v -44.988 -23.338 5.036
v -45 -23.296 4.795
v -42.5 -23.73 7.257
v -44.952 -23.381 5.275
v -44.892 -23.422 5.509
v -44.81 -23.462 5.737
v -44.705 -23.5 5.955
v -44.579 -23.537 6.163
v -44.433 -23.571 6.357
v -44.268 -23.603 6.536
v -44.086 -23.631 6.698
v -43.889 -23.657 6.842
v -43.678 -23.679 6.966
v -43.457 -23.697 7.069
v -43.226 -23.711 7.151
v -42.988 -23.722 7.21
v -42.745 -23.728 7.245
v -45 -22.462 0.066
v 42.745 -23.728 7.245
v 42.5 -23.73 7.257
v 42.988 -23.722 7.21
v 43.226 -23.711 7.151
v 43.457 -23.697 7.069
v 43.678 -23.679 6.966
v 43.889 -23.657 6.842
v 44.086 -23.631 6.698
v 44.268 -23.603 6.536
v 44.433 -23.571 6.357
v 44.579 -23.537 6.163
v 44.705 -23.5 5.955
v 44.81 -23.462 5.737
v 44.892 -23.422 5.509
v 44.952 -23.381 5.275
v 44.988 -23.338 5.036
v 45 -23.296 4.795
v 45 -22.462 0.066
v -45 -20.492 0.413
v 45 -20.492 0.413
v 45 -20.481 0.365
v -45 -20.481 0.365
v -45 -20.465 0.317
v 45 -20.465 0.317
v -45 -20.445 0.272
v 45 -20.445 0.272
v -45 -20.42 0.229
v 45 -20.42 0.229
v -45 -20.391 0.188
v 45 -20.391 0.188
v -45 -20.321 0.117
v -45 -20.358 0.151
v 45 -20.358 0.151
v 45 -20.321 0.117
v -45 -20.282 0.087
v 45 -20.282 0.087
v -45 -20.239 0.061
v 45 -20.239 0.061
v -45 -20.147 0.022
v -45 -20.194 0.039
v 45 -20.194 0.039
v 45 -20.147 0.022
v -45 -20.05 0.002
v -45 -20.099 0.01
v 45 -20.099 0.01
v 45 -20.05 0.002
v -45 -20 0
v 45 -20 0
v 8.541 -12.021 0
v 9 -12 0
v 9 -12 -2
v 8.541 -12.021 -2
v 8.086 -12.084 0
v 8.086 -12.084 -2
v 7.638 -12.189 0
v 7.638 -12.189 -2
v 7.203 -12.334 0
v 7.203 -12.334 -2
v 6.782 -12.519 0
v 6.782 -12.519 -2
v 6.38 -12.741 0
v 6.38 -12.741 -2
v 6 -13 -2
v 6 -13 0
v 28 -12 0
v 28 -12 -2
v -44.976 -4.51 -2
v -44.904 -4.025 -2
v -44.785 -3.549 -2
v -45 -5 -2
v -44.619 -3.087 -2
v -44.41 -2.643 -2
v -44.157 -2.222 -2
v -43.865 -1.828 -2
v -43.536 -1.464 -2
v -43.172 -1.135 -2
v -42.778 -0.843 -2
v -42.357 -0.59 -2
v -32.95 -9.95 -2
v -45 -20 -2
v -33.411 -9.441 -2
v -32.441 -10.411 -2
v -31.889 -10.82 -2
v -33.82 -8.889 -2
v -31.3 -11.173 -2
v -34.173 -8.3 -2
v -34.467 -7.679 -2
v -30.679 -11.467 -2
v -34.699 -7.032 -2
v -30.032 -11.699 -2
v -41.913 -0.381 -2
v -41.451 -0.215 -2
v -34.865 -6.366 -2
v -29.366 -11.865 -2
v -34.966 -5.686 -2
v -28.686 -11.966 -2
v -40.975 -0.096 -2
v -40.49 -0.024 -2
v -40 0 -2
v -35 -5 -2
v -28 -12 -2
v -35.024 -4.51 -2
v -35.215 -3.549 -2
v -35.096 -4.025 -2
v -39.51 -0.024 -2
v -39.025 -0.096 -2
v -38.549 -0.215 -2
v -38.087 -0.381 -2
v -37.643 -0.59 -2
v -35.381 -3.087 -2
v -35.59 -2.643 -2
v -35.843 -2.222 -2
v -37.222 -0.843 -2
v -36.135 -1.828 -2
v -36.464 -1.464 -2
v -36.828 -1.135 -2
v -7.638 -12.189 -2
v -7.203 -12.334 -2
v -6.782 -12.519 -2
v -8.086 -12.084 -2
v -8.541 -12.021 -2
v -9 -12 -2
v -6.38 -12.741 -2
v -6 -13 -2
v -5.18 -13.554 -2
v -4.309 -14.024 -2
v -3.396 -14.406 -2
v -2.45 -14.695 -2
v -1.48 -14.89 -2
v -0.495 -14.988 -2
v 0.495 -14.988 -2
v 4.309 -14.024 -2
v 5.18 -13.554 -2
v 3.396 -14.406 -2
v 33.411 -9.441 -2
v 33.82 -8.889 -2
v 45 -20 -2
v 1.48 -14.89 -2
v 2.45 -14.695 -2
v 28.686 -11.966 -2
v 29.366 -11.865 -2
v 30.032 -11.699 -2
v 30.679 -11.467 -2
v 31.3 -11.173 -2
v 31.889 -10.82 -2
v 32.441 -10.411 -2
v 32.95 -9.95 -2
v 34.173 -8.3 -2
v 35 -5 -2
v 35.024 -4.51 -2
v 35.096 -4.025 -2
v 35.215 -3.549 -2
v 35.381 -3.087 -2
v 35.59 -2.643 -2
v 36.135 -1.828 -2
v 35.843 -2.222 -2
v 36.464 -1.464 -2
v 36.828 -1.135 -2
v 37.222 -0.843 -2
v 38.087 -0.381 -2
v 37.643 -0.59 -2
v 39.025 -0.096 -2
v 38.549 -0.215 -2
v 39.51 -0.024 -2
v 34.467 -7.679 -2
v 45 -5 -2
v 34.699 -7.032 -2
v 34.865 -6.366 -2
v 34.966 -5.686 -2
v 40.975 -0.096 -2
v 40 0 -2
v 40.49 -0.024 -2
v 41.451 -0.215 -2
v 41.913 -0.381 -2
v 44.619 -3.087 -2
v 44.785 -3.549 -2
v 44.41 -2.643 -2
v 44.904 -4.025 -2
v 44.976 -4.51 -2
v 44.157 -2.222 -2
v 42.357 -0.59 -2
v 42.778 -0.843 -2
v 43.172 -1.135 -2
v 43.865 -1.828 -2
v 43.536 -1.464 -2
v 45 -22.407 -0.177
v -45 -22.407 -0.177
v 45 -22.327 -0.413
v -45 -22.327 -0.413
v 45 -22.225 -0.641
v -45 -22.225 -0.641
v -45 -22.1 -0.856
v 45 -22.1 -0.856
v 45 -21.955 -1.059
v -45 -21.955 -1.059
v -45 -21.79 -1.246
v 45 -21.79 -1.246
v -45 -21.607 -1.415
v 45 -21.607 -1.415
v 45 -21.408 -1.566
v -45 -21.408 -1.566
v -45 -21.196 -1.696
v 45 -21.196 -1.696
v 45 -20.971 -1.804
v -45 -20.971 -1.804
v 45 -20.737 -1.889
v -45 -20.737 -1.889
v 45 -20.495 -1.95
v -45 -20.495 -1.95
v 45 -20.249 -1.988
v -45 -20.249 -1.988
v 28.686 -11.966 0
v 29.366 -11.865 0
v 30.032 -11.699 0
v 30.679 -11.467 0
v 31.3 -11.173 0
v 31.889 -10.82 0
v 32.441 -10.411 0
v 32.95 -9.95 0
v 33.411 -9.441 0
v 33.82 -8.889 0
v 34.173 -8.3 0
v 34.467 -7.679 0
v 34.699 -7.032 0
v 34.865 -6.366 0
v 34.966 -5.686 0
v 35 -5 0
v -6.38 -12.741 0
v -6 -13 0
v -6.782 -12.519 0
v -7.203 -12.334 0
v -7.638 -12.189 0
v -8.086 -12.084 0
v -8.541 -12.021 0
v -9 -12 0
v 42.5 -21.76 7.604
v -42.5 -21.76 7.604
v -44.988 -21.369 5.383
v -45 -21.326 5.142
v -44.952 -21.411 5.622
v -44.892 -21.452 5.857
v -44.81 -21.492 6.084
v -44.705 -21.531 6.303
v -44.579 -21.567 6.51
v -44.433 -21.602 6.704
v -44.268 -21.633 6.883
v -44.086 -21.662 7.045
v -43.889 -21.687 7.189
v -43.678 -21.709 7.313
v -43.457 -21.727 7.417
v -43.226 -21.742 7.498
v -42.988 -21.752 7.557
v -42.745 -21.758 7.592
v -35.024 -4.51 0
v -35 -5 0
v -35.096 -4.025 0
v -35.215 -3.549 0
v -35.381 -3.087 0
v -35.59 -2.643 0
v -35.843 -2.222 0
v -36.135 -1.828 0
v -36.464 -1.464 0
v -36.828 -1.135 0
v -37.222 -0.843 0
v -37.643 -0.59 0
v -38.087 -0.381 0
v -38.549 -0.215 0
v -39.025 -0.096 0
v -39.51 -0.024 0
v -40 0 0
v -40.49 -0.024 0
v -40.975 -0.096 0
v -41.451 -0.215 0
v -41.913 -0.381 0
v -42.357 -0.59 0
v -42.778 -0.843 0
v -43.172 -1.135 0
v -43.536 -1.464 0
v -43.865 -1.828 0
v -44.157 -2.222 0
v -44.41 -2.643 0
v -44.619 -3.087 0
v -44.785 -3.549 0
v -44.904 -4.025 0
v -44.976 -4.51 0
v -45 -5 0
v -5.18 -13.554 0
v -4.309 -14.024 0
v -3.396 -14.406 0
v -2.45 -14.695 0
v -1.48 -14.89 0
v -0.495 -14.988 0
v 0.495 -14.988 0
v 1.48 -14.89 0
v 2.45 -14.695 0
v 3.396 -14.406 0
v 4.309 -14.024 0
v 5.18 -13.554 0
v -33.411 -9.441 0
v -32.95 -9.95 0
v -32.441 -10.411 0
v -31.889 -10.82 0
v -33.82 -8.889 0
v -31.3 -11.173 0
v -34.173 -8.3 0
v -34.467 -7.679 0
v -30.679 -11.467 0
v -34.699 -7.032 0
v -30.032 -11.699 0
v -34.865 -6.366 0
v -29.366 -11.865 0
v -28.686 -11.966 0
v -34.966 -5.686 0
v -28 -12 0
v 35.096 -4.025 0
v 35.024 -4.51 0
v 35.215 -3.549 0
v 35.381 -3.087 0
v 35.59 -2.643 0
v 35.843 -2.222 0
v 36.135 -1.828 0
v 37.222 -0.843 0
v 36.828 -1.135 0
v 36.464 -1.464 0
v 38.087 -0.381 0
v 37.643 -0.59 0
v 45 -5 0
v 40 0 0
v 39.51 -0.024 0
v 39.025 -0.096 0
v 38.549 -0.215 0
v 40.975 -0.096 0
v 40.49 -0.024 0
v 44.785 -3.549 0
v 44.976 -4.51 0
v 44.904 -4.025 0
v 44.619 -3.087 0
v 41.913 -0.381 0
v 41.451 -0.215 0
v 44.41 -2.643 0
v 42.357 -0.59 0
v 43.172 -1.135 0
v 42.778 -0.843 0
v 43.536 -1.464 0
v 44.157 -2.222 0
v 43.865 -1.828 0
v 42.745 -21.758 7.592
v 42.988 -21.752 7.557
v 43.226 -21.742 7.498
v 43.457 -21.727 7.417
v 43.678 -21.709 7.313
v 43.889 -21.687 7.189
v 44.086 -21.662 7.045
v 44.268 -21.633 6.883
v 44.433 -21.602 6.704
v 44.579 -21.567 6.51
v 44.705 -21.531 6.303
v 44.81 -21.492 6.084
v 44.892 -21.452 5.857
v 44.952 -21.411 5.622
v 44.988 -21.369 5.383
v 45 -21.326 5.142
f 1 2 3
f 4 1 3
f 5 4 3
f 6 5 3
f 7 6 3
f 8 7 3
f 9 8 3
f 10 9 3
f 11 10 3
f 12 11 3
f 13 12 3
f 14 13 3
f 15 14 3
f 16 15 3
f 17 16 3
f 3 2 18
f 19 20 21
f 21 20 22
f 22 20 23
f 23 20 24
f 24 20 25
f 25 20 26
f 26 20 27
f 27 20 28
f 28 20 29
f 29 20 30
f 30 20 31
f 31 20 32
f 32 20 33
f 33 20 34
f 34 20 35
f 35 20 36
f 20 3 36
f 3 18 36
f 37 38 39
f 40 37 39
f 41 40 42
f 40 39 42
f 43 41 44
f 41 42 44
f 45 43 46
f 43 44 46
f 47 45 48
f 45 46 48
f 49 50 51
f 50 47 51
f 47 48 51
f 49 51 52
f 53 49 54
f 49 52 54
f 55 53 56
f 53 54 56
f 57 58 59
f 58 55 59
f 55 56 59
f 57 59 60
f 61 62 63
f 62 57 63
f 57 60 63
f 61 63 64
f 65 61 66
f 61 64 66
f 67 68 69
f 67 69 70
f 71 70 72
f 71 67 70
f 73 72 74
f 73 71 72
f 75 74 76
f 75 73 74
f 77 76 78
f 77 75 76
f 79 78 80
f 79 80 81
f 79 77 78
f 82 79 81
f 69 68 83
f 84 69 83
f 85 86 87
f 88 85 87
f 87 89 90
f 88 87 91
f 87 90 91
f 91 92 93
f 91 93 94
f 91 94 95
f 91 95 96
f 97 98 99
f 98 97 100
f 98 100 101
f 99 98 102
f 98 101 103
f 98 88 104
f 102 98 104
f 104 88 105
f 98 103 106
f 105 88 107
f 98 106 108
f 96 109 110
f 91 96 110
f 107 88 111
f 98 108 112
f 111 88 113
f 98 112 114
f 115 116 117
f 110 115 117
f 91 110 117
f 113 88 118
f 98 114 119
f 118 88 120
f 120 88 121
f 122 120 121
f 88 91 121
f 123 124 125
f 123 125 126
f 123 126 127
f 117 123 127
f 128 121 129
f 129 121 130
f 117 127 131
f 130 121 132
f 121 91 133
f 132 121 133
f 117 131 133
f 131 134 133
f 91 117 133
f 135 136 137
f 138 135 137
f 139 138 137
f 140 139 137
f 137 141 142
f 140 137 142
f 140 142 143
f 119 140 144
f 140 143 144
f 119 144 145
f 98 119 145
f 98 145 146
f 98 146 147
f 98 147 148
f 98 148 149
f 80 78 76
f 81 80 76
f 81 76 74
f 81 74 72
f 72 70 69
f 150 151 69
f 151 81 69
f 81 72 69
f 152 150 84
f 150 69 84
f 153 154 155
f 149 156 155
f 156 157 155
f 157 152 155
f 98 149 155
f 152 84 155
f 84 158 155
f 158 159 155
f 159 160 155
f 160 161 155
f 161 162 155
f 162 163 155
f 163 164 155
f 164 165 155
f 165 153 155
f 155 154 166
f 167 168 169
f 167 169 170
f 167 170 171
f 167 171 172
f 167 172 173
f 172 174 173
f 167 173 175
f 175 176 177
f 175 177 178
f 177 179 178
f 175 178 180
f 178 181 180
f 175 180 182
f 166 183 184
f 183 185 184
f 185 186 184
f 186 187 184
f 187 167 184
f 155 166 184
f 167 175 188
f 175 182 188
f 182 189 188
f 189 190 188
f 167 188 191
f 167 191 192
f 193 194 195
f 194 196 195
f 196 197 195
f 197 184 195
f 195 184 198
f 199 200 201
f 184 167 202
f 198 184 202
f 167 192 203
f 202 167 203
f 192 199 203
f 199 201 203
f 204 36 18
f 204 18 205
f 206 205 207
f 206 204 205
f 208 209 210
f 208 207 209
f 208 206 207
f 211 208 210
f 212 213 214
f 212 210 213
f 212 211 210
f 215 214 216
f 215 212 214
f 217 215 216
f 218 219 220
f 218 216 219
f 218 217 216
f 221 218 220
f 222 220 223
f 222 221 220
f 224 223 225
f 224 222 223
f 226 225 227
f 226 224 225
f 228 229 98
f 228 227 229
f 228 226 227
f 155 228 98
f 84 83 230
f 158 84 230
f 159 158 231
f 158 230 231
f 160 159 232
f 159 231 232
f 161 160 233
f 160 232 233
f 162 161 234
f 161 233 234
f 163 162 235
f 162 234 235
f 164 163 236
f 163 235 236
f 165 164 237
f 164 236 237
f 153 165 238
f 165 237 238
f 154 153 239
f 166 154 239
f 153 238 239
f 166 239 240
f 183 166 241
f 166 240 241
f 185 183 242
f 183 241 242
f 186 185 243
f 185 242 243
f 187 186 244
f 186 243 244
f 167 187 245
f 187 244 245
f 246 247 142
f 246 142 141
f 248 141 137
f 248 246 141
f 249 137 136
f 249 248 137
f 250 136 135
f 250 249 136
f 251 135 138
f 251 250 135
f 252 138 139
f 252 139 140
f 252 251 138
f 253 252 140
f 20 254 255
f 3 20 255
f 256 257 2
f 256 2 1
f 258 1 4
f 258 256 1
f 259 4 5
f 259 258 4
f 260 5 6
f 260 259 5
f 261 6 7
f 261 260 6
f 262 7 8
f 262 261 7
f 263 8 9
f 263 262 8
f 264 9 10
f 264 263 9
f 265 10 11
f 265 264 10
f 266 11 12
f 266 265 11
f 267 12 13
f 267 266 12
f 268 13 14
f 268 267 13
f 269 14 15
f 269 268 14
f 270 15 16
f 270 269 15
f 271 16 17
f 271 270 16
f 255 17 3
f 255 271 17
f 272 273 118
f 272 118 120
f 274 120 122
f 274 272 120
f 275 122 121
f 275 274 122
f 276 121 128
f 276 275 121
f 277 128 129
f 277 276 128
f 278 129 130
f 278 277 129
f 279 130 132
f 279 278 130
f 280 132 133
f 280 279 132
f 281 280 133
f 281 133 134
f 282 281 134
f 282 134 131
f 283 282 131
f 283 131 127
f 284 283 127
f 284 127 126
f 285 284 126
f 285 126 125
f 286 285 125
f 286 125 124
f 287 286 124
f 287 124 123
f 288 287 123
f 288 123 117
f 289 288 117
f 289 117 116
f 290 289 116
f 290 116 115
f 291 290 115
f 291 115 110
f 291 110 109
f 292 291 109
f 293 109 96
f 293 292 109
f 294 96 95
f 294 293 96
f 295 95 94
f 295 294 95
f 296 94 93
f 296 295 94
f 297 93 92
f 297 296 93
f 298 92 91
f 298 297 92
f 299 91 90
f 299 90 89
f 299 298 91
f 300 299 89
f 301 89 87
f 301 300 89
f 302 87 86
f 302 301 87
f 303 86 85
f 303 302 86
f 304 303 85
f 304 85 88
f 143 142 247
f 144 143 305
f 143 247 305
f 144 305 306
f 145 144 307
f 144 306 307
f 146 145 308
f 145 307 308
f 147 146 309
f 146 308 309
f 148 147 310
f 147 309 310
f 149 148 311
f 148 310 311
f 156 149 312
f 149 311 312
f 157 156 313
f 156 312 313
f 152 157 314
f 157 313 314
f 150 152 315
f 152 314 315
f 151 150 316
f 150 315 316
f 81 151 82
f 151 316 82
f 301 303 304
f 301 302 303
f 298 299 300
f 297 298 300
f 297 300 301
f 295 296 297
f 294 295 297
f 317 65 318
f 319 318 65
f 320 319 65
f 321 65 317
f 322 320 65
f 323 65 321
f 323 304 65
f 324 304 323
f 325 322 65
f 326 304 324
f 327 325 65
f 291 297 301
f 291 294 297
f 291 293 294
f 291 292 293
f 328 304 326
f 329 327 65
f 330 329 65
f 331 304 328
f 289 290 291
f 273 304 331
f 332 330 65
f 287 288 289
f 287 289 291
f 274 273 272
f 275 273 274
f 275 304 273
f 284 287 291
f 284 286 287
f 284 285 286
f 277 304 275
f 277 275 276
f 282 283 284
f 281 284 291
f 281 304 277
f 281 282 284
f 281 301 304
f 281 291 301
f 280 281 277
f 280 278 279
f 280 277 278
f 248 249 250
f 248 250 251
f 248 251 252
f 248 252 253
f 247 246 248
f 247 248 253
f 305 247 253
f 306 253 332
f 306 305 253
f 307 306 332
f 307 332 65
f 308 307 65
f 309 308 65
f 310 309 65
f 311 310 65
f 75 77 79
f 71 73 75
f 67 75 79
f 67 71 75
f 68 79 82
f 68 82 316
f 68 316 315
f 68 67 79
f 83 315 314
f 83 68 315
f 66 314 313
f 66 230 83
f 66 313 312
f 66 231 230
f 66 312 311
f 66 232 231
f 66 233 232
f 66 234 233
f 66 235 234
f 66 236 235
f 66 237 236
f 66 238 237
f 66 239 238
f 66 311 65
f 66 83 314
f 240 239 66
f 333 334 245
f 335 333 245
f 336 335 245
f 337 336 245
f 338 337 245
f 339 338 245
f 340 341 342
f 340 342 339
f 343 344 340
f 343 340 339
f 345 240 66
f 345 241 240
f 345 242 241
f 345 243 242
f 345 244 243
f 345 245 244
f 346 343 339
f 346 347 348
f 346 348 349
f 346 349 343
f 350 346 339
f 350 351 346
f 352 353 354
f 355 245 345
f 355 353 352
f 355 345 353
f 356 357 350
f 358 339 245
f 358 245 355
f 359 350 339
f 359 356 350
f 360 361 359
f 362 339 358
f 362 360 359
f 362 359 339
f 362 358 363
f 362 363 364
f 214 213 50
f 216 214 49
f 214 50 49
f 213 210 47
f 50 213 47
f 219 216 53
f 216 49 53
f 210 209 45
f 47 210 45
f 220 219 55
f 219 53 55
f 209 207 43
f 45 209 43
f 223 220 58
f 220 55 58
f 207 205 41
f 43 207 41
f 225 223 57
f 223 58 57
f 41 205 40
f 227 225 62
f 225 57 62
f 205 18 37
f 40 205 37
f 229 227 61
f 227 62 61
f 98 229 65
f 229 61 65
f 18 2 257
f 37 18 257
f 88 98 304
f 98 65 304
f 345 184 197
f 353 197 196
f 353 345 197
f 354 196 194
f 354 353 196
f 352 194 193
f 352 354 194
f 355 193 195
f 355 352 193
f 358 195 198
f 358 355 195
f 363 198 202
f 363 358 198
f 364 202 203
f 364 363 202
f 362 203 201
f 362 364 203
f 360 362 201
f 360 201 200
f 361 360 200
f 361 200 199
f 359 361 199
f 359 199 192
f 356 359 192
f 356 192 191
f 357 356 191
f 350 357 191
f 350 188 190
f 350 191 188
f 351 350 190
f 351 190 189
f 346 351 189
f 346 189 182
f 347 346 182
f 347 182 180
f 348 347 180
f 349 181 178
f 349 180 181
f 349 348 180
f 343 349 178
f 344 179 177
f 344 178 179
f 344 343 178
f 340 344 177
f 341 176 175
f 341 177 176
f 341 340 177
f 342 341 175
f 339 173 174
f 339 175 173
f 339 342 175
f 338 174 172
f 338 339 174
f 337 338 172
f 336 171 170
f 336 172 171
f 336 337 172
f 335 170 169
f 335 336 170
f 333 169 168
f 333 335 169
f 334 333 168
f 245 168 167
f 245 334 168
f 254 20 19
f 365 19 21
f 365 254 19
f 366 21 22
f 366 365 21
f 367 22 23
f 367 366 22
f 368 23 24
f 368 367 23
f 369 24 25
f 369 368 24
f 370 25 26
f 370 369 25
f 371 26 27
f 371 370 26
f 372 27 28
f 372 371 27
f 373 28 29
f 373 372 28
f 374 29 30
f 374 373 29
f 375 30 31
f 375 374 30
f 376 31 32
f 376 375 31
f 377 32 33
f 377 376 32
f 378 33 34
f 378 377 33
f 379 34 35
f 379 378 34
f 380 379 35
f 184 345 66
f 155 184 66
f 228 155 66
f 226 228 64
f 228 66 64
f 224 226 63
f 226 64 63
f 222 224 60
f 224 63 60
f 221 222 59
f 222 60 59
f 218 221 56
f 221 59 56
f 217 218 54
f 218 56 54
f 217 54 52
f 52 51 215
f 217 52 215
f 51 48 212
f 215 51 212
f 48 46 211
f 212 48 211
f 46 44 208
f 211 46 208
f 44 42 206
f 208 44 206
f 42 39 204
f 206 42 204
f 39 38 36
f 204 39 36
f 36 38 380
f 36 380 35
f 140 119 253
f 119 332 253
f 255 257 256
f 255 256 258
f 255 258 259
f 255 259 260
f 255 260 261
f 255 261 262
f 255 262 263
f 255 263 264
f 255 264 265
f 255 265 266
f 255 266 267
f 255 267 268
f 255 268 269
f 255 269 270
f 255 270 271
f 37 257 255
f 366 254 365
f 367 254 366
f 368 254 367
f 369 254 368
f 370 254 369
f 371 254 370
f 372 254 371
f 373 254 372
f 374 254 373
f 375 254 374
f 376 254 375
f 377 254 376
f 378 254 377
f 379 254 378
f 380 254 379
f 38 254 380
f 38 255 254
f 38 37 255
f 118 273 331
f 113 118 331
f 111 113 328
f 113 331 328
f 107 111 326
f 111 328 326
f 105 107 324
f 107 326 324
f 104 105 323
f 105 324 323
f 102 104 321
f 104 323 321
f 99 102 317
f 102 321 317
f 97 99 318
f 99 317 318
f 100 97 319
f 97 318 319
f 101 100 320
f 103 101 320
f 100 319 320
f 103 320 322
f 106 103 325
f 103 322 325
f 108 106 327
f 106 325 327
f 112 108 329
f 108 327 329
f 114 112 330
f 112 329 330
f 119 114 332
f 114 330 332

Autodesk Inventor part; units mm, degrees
ref_plane "YZ Plane" through (0, 0, 0) normal (1, 0, 0) x (0, 1, 0)
ref_plane "XZ Plane" through (0, 0, 0) normal (0, 1, 0) x (-1, 0, 0)
ref_plane "XY Plane" through (0, 0, 0) normal (0, 0, 1) x (1, 0, 0)
sketch "草圖1" plane through (0, 0, 0) normal (0, 0, 1) x (1, 0, 0)
  line L0 (-163.791, 0) -> (203.4358, 0) projected
  line L1 (0, 6.9462) -> (0, -34.4284) projected
  line L2 (-40, 0) -> (-40, 0)
  line L3 (45, -5) -> (45, -25.5)
  line L4 (42.5, -28) -> (-42.5, -28)
  line L5 (-45, -25.5) -> (-45, -5)
  line L6 (-111.33, -20) -> (150.9748, -20)
  arc A0 (-45, -25.5) -> (-42.5, -28) centre (-42.5, -25.5) ccw
  arc A1 (42.5, -28) -> (45, -25.5) centre (42.5, -25.5) ccw
  line L7 (-35, -5) -> (-35, -5)
  line L8 (-28, -12) -> (-9, -12)
  line L9 (35, -5) -> (35, -5)
  line L10 (-35, 0) -> (35, 0) construction
  line L11 (40, 0) -> (40, 0)
  arc A2 (-40, 0) -> (-45, -5) centre (-40, -5) ccw
  arc A3 (45, -5) -> (40, 0) centre (40, -5) ccw
  arc A4 (-35, -5) -> (-40, 0) centre (-40, -5) ccw
  arc A5 (40, 0) -> (35, -5) centre (40, -5) ccw
  arc A6 (-35, -5) -> (-28, -12) centre (-28, -5) ccw
  arc A7 (28, -12) -> (35, -5) centre (28, -5) ccw
  circle A8 centre (-40, -5) radius 1.4
  circle A9 centre (40, -5) radius 1.4
  line L12 (-7.5, -12) -> (7.5, -12) construction
  line L13 (9, -12) -> (28, -12)
  line L14 (0, -18.0742) -> (0, 0) construction
  arc A10 (-6, -13) -> (6, -13) centre (0, -5) ccw
  arc A11 (-6, -13) -> (-9, -12) centre (-9, -17) ccw
  arc A12 (9, -12) -> (6, -13) centre (9, -17) ccw
  point P0 (-45, 0)
  point P1 (45, -28)
  point P2 (45, 0)
  point P3 (-45, -28)
  point P4 (-40, 0)
  point P5 (40, 0)
  point P6 (-7.1414, -12)
  point P7 (7.1414, -12)
  dimension "d0" = 90
  dimension "d1" = 8
  dimension "d2" = 20
  dimension "d6" = 2.5
  dimension "d7" = 5
  dimension "d8" = 5
  dimension "d9" = 8
  dimension "d10" = 10
  dimension "d11" = 7
  dimension "d12" = 2.8
  dimension "d19" = 5
  dimension "d20" = 5
  dimension "d21" = 10
  dimension "d22" = 15
extrude "平板1" add sketch "草圖1" against normal blind 2 contours A4 A6 L8 A11 A10 L1 L6 L5 A2 | A3 L3 L6 L1 A10 A12 L13 A7 A5 | L6 L1 L4 A0 L5 | L6 L3 A1 L4 L1 | A8 | A9
bend part "折彎零件1" radius 0.5 angle 80 line through (-111.33, -20, 0) along (1, 0, 0) centre toward (0, 0, 1) moving side (0, -1, 0) both sides no
sketch "草圖2" plane through (-45, -22.462, 0.0659) normal (0, -0.9848078, -0.1736482) x (1, 0, 0)
  line L0 (0, 0) -> (90, 0) projected
  line L1 (90, 4.8019) -> (90, 0) projected
  arc A0 (90, 4.8019) -> (87.5, 7.3019) centre (87.5, 4.8019) ccw projected
  line L2 (2.5, 7.3019) -> (87.5, 7.3019) projected
  arc A1 (2.5, 7.3019) -> (0, 4.8019) centre (2.5, 4.8019) ccw projected
  line L3 (0, 0) -> (0, 4.8019) projected
  line L4 (95.0452, 16.6838) -> (-5.2412, 16.6838)
  line L5 (-5.2412, 16.6838) -> (-5.2412, 5.3019)
  line L6 (-5.2412, 5.3019) -> (95.0452, 5.3019)
  line L7 (95.0452, 5.3019) -> (95.0452, 16.6838)
  point P0 (45, -3.9654)
  dimension "d23" = 2
feature "手工切割" [suppressed]
equation "\"d24\" = 厚度"
equation "\"d3\" = 厚度"
equation "\"折彎半徑\" = 厚度"
equation "\"折彎離隙寬度\" = 厚度"
equation "\"折彎離隙深度\" = 0.5 * 厚度"
equation "\"轉角離隙大小\" = 4 * 厚度"
equation "\"最小剩餘\" = 2 * 厚度"
equation "\"轉移半徑\" = 折彎半徑"
equation "\"Jacobi半徑大小\" = 折彎半徑"
equation "\"間隙大小\" = 厚度"
equation "\"厚度\" = 2"
properties part number "補角片" material "不鏽鋼"
